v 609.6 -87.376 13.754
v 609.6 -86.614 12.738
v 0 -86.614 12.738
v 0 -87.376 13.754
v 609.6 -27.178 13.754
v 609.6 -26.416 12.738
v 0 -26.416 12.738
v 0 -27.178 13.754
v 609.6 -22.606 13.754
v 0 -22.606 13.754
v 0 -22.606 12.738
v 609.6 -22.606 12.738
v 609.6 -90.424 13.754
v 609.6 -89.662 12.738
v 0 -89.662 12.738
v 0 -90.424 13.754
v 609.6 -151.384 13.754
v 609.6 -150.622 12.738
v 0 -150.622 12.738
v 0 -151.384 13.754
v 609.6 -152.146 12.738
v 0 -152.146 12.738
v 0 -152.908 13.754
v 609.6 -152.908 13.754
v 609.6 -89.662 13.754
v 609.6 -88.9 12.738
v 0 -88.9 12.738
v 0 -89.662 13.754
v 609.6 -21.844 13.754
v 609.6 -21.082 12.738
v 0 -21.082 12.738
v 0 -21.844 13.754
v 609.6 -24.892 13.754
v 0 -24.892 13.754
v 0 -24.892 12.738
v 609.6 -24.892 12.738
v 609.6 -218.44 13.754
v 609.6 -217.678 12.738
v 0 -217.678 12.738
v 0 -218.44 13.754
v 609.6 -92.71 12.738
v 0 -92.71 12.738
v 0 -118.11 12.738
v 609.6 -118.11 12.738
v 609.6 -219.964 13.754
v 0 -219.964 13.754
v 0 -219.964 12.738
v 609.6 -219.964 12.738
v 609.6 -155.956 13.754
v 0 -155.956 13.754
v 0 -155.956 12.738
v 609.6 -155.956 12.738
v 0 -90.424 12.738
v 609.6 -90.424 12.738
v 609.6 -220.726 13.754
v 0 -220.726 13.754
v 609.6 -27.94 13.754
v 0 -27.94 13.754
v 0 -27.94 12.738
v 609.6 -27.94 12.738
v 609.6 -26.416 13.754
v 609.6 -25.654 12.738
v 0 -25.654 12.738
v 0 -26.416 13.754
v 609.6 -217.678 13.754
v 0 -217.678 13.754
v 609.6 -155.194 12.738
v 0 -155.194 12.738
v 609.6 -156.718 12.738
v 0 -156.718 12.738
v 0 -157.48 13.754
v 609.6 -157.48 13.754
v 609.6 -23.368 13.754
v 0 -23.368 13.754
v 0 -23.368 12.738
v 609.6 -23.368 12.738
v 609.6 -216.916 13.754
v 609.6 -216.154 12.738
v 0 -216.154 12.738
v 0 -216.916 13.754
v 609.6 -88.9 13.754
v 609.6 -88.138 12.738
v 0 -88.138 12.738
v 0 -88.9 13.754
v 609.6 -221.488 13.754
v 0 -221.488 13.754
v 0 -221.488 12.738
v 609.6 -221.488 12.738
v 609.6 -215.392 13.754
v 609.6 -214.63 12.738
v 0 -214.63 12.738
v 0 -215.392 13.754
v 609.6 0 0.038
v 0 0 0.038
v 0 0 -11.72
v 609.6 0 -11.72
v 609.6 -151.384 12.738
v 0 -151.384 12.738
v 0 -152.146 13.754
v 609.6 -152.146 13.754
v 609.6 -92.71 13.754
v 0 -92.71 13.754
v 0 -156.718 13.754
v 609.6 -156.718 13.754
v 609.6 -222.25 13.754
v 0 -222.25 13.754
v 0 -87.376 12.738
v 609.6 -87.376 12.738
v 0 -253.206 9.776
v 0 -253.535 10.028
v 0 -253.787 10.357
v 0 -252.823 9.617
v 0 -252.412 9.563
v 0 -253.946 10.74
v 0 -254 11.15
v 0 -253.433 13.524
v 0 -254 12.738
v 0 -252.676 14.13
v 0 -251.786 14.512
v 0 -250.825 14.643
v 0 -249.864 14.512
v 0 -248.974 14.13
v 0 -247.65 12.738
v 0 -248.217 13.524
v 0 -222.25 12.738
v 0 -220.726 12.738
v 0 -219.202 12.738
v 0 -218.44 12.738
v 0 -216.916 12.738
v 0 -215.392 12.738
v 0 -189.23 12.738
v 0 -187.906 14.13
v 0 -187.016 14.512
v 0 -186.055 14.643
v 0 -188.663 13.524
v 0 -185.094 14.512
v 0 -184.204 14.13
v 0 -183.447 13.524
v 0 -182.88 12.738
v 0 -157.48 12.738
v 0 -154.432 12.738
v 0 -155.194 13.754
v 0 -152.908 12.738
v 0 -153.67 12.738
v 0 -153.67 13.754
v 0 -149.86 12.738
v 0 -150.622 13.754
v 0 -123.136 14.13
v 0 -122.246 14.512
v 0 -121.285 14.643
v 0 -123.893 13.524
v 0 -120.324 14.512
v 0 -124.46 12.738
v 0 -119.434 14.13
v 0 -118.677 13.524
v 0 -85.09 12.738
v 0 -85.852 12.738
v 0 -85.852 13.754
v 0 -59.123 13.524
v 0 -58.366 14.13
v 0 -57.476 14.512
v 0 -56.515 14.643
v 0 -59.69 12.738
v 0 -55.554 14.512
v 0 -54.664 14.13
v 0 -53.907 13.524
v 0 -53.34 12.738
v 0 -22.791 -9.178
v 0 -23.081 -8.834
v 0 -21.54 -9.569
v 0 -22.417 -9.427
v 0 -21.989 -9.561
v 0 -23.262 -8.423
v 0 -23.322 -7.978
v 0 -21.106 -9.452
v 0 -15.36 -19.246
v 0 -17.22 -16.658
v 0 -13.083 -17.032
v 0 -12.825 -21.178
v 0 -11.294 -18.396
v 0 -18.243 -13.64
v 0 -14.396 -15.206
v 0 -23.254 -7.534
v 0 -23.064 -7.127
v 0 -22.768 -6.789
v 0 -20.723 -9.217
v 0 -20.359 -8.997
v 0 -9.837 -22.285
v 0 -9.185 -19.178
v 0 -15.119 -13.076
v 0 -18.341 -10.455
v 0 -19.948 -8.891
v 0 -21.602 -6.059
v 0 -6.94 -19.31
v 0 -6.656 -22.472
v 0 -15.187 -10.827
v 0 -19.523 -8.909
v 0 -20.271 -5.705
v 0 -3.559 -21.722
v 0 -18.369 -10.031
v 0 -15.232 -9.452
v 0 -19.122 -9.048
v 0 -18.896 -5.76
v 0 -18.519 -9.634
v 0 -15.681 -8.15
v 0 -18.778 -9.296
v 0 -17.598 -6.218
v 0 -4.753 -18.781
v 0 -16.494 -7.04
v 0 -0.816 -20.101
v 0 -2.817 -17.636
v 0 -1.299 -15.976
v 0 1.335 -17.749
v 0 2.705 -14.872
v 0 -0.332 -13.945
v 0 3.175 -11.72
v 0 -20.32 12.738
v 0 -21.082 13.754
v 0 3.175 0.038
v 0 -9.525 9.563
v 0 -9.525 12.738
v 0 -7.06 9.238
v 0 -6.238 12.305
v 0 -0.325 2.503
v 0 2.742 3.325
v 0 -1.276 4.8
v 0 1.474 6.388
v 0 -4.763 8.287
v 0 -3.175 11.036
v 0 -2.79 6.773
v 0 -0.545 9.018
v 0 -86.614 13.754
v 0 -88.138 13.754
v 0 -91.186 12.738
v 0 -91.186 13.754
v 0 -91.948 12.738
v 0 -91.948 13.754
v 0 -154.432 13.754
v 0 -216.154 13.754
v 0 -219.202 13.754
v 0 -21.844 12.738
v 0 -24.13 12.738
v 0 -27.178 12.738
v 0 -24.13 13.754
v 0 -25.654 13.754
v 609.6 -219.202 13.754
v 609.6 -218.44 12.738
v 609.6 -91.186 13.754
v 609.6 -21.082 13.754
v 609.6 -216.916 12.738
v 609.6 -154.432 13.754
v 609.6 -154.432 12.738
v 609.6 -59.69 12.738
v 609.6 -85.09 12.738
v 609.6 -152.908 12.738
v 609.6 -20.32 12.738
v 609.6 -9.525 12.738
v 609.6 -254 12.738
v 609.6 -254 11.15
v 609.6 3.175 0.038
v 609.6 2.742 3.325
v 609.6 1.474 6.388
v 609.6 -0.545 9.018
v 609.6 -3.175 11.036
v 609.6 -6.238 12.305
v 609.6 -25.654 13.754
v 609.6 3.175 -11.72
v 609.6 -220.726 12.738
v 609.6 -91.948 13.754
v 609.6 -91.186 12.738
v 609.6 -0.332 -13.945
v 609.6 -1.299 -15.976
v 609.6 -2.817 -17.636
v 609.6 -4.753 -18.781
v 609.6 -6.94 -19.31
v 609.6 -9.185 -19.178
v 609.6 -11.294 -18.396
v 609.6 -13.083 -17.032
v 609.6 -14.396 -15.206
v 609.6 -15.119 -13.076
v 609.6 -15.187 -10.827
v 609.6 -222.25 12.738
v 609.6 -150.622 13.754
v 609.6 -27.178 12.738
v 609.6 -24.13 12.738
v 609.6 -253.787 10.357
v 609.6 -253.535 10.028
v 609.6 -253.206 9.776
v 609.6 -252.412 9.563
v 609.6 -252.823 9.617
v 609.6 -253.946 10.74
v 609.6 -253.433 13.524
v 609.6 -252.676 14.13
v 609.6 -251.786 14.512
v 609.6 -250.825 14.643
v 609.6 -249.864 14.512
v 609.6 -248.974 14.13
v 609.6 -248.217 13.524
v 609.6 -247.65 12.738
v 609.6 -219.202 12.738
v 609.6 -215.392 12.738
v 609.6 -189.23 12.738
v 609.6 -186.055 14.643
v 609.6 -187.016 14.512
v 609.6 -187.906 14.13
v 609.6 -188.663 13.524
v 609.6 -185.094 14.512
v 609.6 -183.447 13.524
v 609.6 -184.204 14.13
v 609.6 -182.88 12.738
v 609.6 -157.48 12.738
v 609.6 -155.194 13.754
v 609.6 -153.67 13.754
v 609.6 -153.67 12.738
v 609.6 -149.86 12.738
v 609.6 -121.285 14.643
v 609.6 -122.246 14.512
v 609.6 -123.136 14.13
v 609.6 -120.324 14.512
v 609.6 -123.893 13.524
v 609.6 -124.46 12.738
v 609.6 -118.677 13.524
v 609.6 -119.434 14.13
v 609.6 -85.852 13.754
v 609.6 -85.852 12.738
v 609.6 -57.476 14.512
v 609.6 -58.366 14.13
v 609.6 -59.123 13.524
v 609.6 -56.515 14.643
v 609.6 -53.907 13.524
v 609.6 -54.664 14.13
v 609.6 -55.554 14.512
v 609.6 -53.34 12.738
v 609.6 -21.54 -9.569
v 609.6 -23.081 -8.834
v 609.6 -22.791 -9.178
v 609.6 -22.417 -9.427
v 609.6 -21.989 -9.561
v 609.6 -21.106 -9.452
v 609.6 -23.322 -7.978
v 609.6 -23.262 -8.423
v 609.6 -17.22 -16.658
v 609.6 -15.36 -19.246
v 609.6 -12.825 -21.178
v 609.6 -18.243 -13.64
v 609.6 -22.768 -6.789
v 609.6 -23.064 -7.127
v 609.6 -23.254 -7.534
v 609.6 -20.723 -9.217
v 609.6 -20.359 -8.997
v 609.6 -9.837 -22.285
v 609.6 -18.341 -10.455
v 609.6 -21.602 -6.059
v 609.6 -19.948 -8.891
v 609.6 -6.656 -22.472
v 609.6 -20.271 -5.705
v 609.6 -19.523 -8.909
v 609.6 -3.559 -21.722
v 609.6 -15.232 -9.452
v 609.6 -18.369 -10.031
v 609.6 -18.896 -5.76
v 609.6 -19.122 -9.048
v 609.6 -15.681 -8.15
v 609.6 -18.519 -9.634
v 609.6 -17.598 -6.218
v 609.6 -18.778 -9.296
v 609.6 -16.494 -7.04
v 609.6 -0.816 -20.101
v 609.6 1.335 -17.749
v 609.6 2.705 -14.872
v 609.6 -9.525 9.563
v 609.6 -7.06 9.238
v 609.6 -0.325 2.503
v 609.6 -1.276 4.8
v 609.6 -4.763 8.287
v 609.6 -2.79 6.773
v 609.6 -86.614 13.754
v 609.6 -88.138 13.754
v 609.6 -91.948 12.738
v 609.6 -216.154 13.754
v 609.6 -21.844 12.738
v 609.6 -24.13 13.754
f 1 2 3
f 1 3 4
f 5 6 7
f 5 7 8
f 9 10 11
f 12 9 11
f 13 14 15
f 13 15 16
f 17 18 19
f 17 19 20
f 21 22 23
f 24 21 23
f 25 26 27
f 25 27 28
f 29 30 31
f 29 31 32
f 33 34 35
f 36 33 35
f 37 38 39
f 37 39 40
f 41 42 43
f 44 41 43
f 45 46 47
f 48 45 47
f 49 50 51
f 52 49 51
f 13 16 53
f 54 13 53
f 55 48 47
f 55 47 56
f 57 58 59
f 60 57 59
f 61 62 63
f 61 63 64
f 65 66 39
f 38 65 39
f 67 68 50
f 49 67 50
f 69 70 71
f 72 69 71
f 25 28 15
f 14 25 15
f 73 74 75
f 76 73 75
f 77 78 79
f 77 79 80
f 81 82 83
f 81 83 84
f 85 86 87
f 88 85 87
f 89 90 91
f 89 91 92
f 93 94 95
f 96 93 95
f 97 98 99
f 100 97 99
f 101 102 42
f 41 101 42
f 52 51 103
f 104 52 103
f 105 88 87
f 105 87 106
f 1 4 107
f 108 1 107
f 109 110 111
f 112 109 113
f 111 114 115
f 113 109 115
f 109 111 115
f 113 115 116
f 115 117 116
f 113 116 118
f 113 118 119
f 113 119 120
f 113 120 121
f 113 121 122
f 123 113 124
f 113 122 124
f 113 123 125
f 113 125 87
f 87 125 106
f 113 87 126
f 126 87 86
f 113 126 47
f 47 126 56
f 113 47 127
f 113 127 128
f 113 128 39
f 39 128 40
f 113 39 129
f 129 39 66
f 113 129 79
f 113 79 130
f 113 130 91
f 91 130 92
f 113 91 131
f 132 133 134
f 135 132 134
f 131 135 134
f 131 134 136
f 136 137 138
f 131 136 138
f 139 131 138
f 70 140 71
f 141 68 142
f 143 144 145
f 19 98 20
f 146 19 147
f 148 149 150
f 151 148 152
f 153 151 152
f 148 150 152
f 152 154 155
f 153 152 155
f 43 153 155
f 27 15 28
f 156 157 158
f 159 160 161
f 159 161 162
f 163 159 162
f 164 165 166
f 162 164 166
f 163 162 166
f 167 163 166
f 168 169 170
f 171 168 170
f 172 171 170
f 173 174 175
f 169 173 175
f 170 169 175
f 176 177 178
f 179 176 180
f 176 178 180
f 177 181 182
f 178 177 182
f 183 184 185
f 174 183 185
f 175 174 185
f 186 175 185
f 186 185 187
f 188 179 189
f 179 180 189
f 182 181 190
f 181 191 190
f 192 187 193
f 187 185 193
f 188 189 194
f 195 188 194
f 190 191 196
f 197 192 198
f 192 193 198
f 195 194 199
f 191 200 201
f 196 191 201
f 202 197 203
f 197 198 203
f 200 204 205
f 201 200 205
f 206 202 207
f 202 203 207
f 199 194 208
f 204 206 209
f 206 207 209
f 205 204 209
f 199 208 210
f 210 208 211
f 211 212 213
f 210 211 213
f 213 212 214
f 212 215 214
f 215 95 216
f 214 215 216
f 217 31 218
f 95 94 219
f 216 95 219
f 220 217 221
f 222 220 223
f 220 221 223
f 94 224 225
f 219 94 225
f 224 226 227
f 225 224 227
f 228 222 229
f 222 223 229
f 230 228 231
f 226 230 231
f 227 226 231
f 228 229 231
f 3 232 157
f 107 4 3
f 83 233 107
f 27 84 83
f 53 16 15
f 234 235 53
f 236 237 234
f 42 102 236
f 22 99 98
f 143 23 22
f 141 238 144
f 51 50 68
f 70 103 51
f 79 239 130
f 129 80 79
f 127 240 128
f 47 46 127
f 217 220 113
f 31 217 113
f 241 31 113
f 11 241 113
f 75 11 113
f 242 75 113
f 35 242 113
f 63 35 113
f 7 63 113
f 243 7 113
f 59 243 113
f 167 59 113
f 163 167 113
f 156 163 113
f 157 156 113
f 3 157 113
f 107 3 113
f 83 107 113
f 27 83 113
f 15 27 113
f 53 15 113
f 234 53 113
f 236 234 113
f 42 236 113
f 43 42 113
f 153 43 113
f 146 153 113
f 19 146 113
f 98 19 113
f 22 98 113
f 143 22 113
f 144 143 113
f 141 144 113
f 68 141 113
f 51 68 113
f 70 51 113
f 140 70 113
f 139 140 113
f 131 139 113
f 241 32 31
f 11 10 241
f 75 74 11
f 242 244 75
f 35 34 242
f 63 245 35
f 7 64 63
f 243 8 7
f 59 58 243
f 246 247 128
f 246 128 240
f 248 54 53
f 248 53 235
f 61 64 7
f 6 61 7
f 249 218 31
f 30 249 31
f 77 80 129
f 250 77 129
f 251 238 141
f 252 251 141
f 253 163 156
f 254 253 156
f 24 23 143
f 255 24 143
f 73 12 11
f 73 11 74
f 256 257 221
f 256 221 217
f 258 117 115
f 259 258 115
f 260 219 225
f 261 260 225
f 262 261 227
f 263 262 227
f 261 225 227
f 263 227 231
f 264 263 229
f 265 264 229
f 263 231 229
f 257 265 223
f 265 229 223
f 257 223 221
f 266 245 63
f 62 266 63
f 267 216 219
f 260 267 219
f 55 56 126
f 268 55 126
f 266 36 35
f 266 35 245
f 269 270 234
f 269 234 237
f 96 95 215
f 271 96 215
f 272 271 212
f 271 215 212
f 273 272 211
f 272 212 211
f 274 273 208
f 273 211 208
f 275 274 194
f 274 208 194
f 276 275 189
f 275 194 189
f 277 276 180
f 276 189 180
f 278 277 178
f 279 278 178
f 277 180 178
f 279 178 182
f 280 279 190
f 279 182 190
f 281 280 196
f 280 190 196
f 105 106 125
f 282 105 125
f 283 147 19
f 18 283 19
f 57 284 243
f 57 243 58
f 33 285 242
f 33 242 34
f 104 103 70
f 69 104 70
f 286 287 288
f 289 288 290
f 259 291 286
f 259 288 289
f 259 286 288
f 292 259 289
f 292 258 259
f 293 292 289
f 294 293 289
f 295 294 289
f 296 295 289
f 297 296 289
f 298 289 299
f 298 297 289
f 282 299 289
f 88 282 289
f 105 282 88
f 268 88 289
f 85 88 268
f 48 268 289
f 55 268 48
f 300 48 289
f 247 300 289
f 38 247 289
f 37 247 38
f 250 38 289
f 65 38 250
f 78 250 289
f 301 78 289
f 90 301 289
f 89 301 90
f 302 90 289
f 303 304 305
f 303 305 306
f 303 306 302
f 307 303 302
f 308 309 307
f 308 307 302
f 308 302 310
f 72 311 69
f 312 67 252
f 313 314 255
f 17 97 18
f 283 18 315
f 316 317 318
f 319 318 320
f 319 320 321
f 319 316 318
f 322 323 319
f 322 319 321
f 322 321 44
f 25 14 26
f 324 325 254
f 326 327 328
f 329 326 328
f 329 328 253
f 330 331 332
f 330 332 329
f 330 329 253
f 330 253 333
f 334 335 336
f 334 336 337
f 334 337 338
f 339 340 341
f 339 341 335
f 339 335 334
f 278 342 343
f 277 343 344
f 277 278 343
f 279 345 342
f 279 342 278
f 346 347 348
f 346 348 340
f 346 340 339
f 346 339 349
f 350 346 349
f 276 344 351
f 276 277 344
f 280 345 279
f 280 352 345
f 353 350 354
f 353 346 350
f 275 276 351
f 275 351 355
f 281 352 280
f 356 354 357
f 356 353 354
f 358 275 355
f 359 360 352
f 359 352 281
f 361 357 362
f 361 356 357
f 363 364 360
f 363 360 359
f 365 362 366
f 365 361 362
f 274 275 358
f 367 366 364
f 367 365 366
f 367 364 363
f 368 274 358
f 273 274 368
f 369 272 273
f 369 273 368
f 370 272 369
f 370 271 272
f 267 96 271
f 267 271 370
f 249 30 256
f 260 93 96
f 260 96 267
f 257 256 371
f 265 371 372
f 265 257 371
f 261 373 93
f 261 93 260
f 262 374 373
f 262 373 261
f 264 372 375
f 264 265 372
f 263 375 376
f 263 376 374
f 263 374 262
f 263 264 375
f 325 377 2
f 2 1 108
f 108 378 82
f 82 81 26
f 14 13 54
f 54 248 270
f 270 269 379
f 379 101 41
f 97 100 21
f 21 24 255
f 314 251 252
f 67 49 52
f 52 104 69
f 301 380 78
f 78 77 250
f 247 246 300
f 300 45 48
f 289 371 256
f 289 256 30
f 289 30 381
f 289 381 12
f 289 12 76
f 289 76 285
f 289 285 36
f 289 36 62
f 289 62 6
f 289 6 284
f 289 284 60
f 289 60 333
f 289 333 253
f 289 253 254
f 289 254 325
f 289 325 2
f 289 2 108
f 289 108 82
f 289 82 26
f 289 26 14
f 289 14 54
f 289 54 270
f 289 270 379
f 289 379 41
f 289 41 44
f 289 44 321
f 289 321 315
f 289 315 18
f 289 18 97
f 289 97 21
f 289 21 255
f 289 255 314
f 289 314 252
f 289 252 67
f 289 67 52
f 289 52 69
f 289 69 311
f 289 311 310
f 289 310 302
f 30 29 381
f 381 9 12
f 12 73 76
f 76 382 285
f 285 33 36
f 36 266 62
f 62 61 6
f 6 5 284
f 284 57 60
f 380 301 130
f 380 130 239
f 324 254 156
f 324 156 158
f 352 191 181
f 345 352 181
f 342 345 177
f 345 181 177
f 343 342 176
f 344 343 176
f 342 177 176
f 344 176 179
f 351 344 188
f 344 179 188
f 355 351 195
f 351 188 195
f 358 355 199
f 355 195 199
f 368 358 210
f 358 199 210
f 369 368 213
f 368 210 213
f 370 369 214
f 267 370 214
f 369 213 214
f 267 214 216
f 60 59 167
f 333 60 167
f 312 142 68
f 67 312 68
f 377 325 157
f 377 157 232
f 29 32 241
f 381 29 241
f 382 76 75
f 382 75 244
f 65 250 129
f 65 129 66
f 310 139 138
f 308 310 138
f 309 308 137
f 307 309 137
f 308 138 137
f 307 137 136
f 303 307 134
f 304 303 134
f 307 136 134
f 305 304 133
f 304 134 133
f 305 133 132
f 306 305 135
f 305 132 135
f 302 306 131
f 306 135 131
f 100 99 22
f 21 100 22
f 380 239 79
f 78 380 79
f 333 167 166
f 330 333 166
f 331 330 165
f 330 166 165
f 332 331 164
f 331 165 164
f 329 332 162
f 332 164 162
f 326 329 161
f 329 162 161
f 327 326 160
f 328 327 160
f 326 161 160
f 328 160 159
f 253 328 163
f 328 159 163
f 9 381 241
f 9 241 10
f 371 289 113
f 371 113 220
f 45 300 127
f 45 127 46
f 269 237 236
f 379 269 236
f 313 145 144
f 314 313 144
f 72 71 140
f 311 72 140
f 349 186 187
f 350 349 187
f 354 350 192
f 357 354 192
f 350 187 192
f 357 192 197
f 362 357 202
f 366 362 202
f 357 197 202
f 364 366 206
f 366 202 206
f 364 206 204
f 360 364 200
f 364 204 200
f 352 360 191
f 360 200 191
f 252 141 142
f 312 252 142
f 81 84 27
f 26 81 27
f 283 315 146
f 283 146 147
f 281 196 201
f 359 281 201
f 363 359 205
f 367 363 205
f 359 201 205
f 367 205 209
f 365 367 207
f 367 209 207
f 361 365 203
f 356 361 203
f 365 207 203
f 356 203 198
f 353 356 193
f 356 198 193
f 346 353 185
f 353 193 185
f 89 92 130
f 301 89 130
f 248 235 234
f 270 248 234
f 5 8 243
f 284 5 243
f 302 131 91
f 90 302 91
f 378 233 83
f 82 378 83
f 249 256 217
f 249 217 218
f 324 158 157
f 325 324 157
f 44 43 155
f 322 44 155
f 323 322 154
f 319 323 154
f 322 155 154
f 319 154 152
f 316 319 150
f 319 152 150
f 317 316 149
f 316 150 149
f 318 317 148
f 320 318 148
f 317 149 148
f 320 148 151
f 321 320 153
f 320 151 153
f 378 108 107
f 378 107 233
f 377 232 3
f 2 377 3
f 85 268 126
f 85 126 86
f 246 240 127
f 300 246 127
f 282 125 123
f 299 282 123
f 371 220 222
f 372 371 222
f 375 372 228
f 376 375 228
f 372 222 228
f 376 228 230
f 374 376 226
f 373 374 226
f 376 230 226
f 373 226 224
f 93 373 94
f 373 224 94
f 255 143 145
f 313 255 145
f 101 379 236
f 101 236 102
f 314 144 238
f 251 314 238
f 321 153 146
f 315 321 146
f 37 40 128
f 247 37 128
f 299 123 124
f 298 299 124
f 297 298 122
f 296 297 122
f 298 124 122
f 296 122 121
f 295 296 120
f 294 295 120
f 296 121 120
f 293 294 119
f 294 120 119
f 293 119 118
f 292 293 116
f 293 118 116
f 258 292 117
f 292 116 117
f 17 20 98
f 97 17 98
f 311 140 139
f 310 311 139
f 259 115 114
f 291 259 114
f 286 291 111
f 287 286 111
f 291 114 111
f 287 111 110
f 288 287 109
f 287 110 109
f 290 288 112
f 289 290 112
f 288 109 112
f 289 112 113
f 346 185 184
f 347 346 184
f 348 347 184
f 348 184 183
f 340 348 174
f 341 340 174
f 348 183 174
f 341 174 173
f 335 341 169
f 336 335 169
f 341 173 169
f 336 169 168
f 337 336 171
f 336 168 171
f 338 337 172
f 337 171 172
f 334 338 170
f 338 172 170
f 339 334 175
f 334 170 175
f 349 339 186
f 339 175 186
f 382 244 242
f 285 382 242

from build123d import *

# Parameters (mm, degrees)
F1_DEPTH = 609.6


with BuildPart() as f1:
    # F0 (on Right) → F1 (new body)
    with BuildSketch(Plane.YZ):
        with BuildLine():
            Line((-59.69, 12.737884), (-53.34, 12.737884))
            ThreePointArc((-53.34, 12.737884), (-56.515, 14.642884), (-59.69, 12.737884))
        make_face()
        with BuildLine():
            ThreePointArc((-118.11, 12.737884), (-121.285, 14.642884), (-124.46, 12.737884))
            Line((-124.46, 12.737884), (-118.11, 12.737884))
        make_face()
        with BuildLine():
            Line((-252.4125, 9.562884), (-9.525, 9.562884))
            ThreePointArc((-9.525, 9.562884), (-2.789808, 6.773076), (0, 0.037884))
            Line((0, 0.037884), (0, -11.720433))
            ThreePointArc((0, -11.720433), (-8.067335, -19.327291), (-15.187478, -10.827306))
            ThreePointArc((-15.187478, -10.827306), (-17.598242, -6.218379), (-22.768182, -6.789089))
            ThreePointArc((-22.768182, -6.789089), (-22.948389, -9.016326), (-20.72294, -9.217406))
            ThreePointArc((-20.72294, -9.217406), (-19.12196, -9.047525), (-18.340594, -10.45517))
            ThreePointArc((-18.340594, -10.45517), (-8.253725, -22.496816), (3.175, -11.720433))
            Line((3.175, -11.720433), (3.175, 0.037884))
            ThreePointArc((3.175, 0.037884), (-0.544744, 9.01814), (-9.525, 12.737884))
            Line((-9.525, 12.737884), (-20.32, 12.737884))
            Line((-20.32, 12.737884), (-21.082, 12.737884))
            Line((-21.082, 12.737884), (-21.844, 12.737884))
            Line((-21.844, 12.737884), (-22.606, 12.737884))
            Line((-22.606, 12.737884), (-23.368, 12.737884))
            Line((-23.368, 12.737884), (-24.13, 12.737884))
            Line((-24.13, 12.737884), (-24.892, 12.737884))
            Line((-24.892, 12.737884), (-25.654, 12.737884))
            Line((-25.654, 12.737884), (-26.416, 12.737884))
            Line((-26.416, 12.737884), (-27.178, 12.737884))
            Line((-27.178, 12.737884), (-27.94, 12.737884))
            Line((-27.94, 12.737884), (-53.34, 12.737884))
            Line((-53.34, 12.737884), (-59.69, 12.737884))
            Line((-59.69, 12.737884), (-85.09, 12.737884))
            Line((-85.09, 12.737884), (-85.852, 12.737884))
            Line((-85.852, 12.737884), (-86.614, 12.737884))
            Line((-86.614, 12.737884), (-87.376, 12.737884))
            Line((-87.376, 12.737884), (-88.138, 12.737884))
            Line((-88.138, 12.737884), (-88.9, 12.737884))
            Line((-88.9, 12.737884), (-89.662, 12.737884))
            Line((-89.662, 12.737884), (-90.424, 12.737884))
            Line((-90.424, 12.737884), (-91.186, 12.737884))
            Line((-91.186, 12.737884), (-91.948, 12.737884))
            Line((-91.948, 12.737884), (-92.71, 12.737884))
            Line((-92.71, 12.737884), (-118.11, 12.737884))
            Line((-118.11, 12.737884), (-124.46, 12.737884))
            Line((-124.46, 12.737884), (-149.86, 12.737884))
            Line((-149.86, 12.737884), (-150.622, 12.737884))
            Line((-150.622, 12.737884), (-151.384, 12.737884))
            Line((-151.384, 12.737884), (-152.146, 12.737884))
            Line((-152.146, 12.737884), (-152.908, 12.737884))
            Line((-152.908, 12.737884), (-153.67, 12.737884))
            Line((-153.67, 12.737884), (-154.432, 12.737884))
            Line((-154.432, 12.737884), (-155.194, 12.737884))
            Line((-155.194, 12.737884), (-155.956, 12.737884))
            Line((-155.956, 12.737884), (-156.718, 12.737884))
            Line((-156.718, 12.737884), (-157.48, 12.737884))
            Line((-157.48, 12.737884), (-182.88, 12.737884))
            Line((-182.88, 12.737884), (-189.23, 12.737884))
            Line((-189.23, 12.737884), (-214.63, 12.737884))
            Line((-214.63, 12.737884), (-215.392, 12.737884))
            Line((-215.392, 12.737884), (-216.154, 12.737884))
            Line((-216.154, 12.737884), (-216.916, 12.737884))
            Line((-216.916, 12.737884), (-217.678, 12.737884))
            Line((-217.678, 12.737884), (-218.44, 12.737884))
            Line((-218.44, 12.737884), (-219.202, 12.737884))
            Line((-219.202, 12.737884), (-219.964, 12.737884))
            Line((-219.964, 12.737884), (-220.726, 12.737884))
            Line((-220.726, 12.737884), (-221.488, 12.737884))
            Line((-221.488, 12.737884), (-222.25, 12.737884))
            Line((-222.25, 12.737884), (-247.65, 12.737884))
            Line((-247.65, 12.737884), (-254, 12.737884))
            Line((-254, 12.737884), (-254, 11.150384))
            ThreePointArc((-254, 11.150384), (-253.535032, 10.027852), (-252.4125, 9.562884))
        make_face()
        with BuildLine():
            ThreePointArc((-247.65, 12.737884), (-250.825, 14.642884), (-254, 12.737884))
            Line((-254, 12.737884), (-247.65, 12.737884))
        make_face()
        with BuildLine():
            ThreePointArc((-182.88, 12.737884), (-186.055, 14.642884), (-189.23, 12.737884))
            Line((-189.23, 12.737884), (-182.88, 12.737884))
        make_face()
        Polygon((-85.852, 12.737884), (-85.09, 12.737884), (-85.852, 13.753884), align=None)
        Polygon((-21.082, 12.737884), (-20.32, 12.737884), (-21.082, 13.753884), align=None)
        Polygon((-222.25, 13.753884), (-222.25, 12.737884), (-221.488, 12.737884), align=None)
        Polygon((-21.844, 12.737884), (-21.082, 12.737884), (-21.844, 13.753884), align=None)
        Polygon((-150.622, 13.753884), (-150.622, 12.737884), (-149.86, 12.737884), align=None)
        Polygon((-151.384, 13.753884), (-151.384, 12.737884), (-150.622, 12.737884), align=None)
        Polygon((-221.488, 13.753884), (-221.488, 12.737884), (-220.726, 12.737884), align=None)
        Polygon((-86.614, 12.737884), (-85.852, 12.737884), (-86.614, 13.753884), align=None)
        Polygon((-26.416, 12.737884), (-25.654, 12.737884), (-26.416, 13.753884), align=None)
        Polygon((-27.178, 12.737884), (-26.416, 12.737884), (-27.178, 13.753884), align=None)
        Polygon((-152.908, 13.753884), (-152.908, 12.737884), (-152.146, 12.737884), align=None)
        Polygon((-157.48, 13.753884), (-157.48, 12.737884), (-156.718, 12.737884), align=None)
        Polygon((-215.392, 13.753884), (-215.392, 12.737884), (-214.63, 12.737884), align=None)
        Polygon((-92.71, 13.753884), (-92.71, 12.737884), (-91.948, 12.737884), align=None)
        Polygon((-89.662, 12.737884), (-88.9, 12.737884), (-89.662, 13.753884), align=None)
        Polygon((-155.194, 13.753884), (-155.194, 12.737884), (-154.432, 12.737884), align=None)
        Polygon((-153.67, 13.753884), (-153.67, 12.737884), (-152.908, 12.737884), align=None)
        Polygon((-91.948, 12.737884), (-91.186, 12.737884), (-91.948, 13.753884), align=None)
        Polygon((-87.376, 12.737884), (-86.614, 12.737884), (-87.376, 13.753884), align=None)
        Polygon((-24.13, 12.737884), (-23.368, 12.737884), (-24.13, 13.753884), align=None)
        Polygon((-27.94, 12.737884), (-27.178, 12.737884), (-27.94, 13.753884), align=None)
        Polygon((-90.424, 12.737884), (-89.662, 12.737884), (-90.424, 13.753884), align=None)
        Polygon((-23.368, 12.737884), (-22.606, 12.737884), (-23.368, 13.753884), align=None)
        Polygon((-218.44, 13.753884), (-218.44, 12.737884), (-217.678, 12.737884), align=None)
        Polygon((-219.202, 13.753884), (-219.202, 12.737884), (-218.44, 12.737884), align=None)
        Polygon((-216.154, 13.753884), (-216.154, 12.737884), (-215.392, 12.737884), align=None)
        Polygon((-155.956, 13.753884), (-155.956, 12.737884), (-155.194, 12.737884), align=None)
        Polygon((-219.964, 13.753884), (-219.964, 12.737884), (-219.202, 12.737884), align=None)
        Polygon((-88.138, 12.737884), (-87.376, 12.737884), (-88.138, 13.753884), align=None)
        Polygon((-88.9, 12.737884), (-88.138, 12.737884), (-88.9, 13.753884), align=None)
        Polygon((-24.892, 12.737884), (-24.13, 12.737884), (-24.892, 13.753884), align=None)
        Polygon((-152.146, 13.753884), (-152.146, 12.737884), (-151.384, 12.737884), align=None)
        Polygon((-220.726, 13.753884), (-220.726, 12.737884), (-219.964, 12.737884), align=None)
        Polygon((-216.916, 13.753884), (-216.916, 12.737884), (-216.154, 12.737884), align=None)
        Polygon((-156.718, 13.753884), (-156.718, 12.737884), (-155.956, 12.737884), align=None)
        Polygon((-154.432, 13.753884), (-154.432, 12.737884), (-153.67, 12.737884), align=None)
        Polygon((-217.678, 13.753884), (-217.678, 12.737884), (-216.916, 12.737884), align=None)
        Polygon((-25.654, 12.737884), (-24.892, 12.737884), (-25.654, 13.753884), align=None)
        Polygon((-22.606, 12.737884), (-21.844, 12.737884), (-22.606, 13.753884), align=None)
        Polygon((-91.186, 12.737884), (-90.424, 12.737884), (-91.186, 13.753884), align=None)
    extrude(amount=F1_DEPTH)


solid = f1.part
